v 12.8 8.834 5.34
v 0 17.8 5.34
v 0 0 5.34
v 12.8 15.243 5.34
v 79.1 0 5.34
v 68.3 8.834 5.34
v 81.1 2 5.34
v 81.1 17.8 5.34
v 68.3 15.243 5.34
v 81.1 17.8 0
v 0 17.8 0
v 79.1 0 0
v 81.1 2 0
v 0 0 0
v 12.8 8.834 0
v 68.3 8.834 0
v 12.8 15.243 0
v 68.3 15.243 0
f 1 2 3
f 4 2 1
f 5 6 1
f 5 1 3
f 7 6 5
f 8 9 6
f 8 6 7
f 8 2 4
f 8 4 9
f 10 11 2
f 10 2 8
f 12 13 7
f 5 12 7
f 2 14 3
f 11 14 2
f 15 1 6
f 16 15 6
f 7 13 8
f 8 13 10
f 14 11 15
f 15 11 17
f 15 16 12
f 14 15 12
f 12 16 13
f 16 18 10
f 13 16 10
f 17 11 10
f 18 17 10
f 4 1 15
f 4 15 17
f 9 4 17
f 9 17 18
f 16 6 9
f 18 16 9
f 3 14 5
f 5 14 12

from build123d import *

# Parameters (mm, degrees)
SKETCH_1_W          = 81.1
SKETCH_1_H          = 17.8
EXTRUDE_1_DEPTH     = 5.34
CHAMFER_1_SIZE      = 2
SKETCH_2_W          = 55.5
SKETCH_2_H          = 6.409449073
CUT_EXTRUDE_1_DEPTH = 6.34


with BuildPart() as part:
    # Эскиз1 → Бобышка-Вытянуть1 (new body)
    with BuildSketch(Plane.XY):
        with Locations((40.55, 8.9)):
            Rectangle(SKETCH_1_W, SKETCH_1_H)
    extrude(amount=EXTRUDE_1_DEPTH)

    # Фаска1
    chamfer_1_edges = [part.edges().sort_by_distance(p)[0] for p in [
        (81.1, 0, 2.67),
    ]]
    chamfer(chamfer_1_edges, length=CHAMFER_1_SIZE)

    # Эскиз2 → Вырез-Вытянуть1 (cut, through all)
    with BuildSketch(Plane.XY.offset(5.34)):
        with Locations((40.55, 12.038647742)):
            Rectangle(SKETCH_2_W, SKETCH_2_H)
    extrude(amount=-CUT_EXTRUDE_1_DEPTH, mode=Mode.SUBTRACT)


solid = part.part
